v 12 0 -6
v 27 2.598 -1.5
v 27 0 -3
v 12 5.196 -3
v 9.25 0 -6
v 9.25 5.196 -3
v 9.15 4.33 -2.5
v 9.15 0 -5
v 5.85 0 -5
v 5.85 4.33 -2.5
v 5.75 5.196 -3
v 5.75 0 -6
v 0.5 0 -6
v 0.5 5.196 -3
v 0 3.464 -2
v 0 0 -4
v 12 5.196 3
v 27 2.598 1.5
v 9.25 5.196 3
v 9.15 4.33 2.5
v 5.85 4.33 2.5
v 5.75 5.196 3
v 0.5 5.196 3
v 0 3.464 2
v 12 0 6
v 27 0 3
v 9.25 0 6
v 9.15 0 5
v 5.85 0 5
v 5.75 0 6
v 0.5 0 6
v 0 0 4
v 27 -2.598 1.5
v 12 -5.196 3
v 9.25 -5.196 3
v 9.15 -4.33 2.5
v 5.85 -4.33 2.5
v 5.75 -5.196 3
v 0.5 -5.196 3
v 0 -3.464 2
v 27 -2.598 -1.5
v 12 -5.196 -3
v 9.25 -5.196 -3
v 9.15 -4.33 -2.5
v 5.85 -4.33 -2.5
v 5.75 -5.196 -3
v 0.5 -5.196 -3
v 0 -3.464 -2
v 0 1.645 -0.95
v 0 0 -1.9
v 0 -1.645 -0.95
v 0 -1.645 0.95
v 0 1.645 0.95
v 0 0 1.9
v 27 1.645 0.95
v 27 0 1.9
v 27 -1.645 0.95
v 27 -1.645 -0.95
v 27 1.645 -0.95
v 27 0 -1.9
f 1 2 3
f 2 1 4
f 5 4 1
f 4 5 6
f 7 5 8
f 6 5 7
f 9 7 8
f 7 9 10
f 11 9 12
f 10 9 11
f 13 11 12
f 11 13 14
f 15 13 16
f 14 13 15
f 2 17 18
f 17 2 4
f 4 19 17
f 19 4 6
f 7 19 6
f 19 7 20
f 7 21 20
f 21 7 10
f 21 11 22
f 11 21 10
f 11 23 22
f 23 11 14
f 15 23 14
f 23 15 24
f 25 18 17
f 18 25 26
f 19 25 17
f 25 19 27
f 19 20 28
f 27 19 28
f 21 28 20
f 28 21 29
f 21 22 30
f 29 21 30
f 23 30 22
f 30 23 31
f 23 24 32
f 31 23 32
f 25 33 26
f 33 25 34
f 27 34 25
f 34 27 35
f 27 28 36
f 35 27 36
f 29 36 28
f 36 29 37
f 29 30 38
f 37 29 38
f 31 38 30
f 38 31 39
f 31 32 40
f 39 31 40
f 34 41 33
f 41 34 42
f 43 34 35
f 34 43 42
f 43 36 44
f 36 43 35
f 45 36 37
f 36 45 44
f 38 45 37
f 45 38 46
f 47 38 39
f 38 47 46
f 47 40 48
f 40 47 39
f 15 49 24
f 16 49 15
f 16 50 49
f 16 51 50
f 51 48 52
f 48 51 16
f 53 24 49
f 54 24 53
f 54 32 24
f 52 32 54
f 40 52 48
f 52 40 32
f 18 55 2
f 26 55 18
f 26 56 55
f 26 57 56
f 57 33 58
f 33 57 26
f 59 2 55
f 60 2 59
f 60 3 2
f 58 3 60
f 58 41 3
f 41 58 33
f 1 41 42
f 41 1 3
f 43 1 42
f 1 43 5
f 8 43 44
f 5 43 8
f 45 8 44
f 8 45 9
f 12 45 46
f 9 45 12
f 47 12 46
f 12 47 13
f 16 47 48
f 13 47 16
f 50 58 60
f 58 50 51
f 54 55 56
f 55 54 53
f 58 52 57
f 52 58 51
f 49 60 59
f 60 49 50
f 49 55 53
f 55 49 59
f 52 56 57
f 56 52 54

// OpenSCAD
// Lights4b
// Ferrules for 3 mm fiber optic sideglows

//p1=[ [0,0], [0,4], [0.5,5], [5.75,5], [5.85,4], [9.15,4], [9.25,5], [12,5], [27,3], [27,0] ];
p1=[ [0,0], [0,4], [0.5,6], [5.75,6], [5.85,5], [9.15,5], [9.25,6], [12,6], [27,3], [27,0] ];

module Ferrule1(){

difference(){
    rotate([0,-90,0])
    rotate_extrude($fn=6){
        rotate([0,0,-90])
        polygon(points=p1);
    }    
    
    color("cyan")
    rotate([0,90,0])
//    cylinder(r1=2.0,r2=1.8, h=50,$fn=6);
    cylinder(r1=1.9,r2=1.9, h=50,$fn=6);
}

}

//---------------------------------------------
// make a solid body version, ie no cut for the fiber
module Ferrule2(){

//difference(){
rotate([0,-90,0])
rotate_extrude($fn=6){
    rotate([0,0,-90])
    polygon(points=p1);
}    

}

//--------------------------------------------------------
// make a solid body version, scale the polygon, use this for making
// cuts into the Rx
module Ferrule3(){

rotate([0,-90,0])
rotate_extrude($fn=6){
    rotate([0,0,-90])
    scale(1.02)
    polygon(points=p1);
}    

}
//--------------------------------------------------------
// make a solid body version, scale the polygon, use this for making
// cuts into the Rx
module Ferrule4(){

intersection(){
rotate([0,-90,0])
rotate_extrude($fn=6){
    rotate([0,0,-90])
    scale(1.02)
    polygon(points=p1);
}    
translate([8,-20,-10]) linear_extrude(height=20) square(40);
}

}

//============================


Ferrule1();


//translate([0,0,-13]) Ferrule4();

/*
color("cyan")
translate([-1,0,0])
rotate([0,90,0])
cylinder(r=1.5,h=40,$fn=30);

color("orange")
translate([0,0,13])
Ferrule2();

color("red")
translate([0,0,2*13])
Ferrule3();

color("pink")
intersection(){
    translate([0,0,3*13])
    difference(){
        Ferrule3();
        Ferrule2();
    }
    translate([-35,0,0])
    linear_extrude(heigth=100)
    square(100,center=true);
}

*/
